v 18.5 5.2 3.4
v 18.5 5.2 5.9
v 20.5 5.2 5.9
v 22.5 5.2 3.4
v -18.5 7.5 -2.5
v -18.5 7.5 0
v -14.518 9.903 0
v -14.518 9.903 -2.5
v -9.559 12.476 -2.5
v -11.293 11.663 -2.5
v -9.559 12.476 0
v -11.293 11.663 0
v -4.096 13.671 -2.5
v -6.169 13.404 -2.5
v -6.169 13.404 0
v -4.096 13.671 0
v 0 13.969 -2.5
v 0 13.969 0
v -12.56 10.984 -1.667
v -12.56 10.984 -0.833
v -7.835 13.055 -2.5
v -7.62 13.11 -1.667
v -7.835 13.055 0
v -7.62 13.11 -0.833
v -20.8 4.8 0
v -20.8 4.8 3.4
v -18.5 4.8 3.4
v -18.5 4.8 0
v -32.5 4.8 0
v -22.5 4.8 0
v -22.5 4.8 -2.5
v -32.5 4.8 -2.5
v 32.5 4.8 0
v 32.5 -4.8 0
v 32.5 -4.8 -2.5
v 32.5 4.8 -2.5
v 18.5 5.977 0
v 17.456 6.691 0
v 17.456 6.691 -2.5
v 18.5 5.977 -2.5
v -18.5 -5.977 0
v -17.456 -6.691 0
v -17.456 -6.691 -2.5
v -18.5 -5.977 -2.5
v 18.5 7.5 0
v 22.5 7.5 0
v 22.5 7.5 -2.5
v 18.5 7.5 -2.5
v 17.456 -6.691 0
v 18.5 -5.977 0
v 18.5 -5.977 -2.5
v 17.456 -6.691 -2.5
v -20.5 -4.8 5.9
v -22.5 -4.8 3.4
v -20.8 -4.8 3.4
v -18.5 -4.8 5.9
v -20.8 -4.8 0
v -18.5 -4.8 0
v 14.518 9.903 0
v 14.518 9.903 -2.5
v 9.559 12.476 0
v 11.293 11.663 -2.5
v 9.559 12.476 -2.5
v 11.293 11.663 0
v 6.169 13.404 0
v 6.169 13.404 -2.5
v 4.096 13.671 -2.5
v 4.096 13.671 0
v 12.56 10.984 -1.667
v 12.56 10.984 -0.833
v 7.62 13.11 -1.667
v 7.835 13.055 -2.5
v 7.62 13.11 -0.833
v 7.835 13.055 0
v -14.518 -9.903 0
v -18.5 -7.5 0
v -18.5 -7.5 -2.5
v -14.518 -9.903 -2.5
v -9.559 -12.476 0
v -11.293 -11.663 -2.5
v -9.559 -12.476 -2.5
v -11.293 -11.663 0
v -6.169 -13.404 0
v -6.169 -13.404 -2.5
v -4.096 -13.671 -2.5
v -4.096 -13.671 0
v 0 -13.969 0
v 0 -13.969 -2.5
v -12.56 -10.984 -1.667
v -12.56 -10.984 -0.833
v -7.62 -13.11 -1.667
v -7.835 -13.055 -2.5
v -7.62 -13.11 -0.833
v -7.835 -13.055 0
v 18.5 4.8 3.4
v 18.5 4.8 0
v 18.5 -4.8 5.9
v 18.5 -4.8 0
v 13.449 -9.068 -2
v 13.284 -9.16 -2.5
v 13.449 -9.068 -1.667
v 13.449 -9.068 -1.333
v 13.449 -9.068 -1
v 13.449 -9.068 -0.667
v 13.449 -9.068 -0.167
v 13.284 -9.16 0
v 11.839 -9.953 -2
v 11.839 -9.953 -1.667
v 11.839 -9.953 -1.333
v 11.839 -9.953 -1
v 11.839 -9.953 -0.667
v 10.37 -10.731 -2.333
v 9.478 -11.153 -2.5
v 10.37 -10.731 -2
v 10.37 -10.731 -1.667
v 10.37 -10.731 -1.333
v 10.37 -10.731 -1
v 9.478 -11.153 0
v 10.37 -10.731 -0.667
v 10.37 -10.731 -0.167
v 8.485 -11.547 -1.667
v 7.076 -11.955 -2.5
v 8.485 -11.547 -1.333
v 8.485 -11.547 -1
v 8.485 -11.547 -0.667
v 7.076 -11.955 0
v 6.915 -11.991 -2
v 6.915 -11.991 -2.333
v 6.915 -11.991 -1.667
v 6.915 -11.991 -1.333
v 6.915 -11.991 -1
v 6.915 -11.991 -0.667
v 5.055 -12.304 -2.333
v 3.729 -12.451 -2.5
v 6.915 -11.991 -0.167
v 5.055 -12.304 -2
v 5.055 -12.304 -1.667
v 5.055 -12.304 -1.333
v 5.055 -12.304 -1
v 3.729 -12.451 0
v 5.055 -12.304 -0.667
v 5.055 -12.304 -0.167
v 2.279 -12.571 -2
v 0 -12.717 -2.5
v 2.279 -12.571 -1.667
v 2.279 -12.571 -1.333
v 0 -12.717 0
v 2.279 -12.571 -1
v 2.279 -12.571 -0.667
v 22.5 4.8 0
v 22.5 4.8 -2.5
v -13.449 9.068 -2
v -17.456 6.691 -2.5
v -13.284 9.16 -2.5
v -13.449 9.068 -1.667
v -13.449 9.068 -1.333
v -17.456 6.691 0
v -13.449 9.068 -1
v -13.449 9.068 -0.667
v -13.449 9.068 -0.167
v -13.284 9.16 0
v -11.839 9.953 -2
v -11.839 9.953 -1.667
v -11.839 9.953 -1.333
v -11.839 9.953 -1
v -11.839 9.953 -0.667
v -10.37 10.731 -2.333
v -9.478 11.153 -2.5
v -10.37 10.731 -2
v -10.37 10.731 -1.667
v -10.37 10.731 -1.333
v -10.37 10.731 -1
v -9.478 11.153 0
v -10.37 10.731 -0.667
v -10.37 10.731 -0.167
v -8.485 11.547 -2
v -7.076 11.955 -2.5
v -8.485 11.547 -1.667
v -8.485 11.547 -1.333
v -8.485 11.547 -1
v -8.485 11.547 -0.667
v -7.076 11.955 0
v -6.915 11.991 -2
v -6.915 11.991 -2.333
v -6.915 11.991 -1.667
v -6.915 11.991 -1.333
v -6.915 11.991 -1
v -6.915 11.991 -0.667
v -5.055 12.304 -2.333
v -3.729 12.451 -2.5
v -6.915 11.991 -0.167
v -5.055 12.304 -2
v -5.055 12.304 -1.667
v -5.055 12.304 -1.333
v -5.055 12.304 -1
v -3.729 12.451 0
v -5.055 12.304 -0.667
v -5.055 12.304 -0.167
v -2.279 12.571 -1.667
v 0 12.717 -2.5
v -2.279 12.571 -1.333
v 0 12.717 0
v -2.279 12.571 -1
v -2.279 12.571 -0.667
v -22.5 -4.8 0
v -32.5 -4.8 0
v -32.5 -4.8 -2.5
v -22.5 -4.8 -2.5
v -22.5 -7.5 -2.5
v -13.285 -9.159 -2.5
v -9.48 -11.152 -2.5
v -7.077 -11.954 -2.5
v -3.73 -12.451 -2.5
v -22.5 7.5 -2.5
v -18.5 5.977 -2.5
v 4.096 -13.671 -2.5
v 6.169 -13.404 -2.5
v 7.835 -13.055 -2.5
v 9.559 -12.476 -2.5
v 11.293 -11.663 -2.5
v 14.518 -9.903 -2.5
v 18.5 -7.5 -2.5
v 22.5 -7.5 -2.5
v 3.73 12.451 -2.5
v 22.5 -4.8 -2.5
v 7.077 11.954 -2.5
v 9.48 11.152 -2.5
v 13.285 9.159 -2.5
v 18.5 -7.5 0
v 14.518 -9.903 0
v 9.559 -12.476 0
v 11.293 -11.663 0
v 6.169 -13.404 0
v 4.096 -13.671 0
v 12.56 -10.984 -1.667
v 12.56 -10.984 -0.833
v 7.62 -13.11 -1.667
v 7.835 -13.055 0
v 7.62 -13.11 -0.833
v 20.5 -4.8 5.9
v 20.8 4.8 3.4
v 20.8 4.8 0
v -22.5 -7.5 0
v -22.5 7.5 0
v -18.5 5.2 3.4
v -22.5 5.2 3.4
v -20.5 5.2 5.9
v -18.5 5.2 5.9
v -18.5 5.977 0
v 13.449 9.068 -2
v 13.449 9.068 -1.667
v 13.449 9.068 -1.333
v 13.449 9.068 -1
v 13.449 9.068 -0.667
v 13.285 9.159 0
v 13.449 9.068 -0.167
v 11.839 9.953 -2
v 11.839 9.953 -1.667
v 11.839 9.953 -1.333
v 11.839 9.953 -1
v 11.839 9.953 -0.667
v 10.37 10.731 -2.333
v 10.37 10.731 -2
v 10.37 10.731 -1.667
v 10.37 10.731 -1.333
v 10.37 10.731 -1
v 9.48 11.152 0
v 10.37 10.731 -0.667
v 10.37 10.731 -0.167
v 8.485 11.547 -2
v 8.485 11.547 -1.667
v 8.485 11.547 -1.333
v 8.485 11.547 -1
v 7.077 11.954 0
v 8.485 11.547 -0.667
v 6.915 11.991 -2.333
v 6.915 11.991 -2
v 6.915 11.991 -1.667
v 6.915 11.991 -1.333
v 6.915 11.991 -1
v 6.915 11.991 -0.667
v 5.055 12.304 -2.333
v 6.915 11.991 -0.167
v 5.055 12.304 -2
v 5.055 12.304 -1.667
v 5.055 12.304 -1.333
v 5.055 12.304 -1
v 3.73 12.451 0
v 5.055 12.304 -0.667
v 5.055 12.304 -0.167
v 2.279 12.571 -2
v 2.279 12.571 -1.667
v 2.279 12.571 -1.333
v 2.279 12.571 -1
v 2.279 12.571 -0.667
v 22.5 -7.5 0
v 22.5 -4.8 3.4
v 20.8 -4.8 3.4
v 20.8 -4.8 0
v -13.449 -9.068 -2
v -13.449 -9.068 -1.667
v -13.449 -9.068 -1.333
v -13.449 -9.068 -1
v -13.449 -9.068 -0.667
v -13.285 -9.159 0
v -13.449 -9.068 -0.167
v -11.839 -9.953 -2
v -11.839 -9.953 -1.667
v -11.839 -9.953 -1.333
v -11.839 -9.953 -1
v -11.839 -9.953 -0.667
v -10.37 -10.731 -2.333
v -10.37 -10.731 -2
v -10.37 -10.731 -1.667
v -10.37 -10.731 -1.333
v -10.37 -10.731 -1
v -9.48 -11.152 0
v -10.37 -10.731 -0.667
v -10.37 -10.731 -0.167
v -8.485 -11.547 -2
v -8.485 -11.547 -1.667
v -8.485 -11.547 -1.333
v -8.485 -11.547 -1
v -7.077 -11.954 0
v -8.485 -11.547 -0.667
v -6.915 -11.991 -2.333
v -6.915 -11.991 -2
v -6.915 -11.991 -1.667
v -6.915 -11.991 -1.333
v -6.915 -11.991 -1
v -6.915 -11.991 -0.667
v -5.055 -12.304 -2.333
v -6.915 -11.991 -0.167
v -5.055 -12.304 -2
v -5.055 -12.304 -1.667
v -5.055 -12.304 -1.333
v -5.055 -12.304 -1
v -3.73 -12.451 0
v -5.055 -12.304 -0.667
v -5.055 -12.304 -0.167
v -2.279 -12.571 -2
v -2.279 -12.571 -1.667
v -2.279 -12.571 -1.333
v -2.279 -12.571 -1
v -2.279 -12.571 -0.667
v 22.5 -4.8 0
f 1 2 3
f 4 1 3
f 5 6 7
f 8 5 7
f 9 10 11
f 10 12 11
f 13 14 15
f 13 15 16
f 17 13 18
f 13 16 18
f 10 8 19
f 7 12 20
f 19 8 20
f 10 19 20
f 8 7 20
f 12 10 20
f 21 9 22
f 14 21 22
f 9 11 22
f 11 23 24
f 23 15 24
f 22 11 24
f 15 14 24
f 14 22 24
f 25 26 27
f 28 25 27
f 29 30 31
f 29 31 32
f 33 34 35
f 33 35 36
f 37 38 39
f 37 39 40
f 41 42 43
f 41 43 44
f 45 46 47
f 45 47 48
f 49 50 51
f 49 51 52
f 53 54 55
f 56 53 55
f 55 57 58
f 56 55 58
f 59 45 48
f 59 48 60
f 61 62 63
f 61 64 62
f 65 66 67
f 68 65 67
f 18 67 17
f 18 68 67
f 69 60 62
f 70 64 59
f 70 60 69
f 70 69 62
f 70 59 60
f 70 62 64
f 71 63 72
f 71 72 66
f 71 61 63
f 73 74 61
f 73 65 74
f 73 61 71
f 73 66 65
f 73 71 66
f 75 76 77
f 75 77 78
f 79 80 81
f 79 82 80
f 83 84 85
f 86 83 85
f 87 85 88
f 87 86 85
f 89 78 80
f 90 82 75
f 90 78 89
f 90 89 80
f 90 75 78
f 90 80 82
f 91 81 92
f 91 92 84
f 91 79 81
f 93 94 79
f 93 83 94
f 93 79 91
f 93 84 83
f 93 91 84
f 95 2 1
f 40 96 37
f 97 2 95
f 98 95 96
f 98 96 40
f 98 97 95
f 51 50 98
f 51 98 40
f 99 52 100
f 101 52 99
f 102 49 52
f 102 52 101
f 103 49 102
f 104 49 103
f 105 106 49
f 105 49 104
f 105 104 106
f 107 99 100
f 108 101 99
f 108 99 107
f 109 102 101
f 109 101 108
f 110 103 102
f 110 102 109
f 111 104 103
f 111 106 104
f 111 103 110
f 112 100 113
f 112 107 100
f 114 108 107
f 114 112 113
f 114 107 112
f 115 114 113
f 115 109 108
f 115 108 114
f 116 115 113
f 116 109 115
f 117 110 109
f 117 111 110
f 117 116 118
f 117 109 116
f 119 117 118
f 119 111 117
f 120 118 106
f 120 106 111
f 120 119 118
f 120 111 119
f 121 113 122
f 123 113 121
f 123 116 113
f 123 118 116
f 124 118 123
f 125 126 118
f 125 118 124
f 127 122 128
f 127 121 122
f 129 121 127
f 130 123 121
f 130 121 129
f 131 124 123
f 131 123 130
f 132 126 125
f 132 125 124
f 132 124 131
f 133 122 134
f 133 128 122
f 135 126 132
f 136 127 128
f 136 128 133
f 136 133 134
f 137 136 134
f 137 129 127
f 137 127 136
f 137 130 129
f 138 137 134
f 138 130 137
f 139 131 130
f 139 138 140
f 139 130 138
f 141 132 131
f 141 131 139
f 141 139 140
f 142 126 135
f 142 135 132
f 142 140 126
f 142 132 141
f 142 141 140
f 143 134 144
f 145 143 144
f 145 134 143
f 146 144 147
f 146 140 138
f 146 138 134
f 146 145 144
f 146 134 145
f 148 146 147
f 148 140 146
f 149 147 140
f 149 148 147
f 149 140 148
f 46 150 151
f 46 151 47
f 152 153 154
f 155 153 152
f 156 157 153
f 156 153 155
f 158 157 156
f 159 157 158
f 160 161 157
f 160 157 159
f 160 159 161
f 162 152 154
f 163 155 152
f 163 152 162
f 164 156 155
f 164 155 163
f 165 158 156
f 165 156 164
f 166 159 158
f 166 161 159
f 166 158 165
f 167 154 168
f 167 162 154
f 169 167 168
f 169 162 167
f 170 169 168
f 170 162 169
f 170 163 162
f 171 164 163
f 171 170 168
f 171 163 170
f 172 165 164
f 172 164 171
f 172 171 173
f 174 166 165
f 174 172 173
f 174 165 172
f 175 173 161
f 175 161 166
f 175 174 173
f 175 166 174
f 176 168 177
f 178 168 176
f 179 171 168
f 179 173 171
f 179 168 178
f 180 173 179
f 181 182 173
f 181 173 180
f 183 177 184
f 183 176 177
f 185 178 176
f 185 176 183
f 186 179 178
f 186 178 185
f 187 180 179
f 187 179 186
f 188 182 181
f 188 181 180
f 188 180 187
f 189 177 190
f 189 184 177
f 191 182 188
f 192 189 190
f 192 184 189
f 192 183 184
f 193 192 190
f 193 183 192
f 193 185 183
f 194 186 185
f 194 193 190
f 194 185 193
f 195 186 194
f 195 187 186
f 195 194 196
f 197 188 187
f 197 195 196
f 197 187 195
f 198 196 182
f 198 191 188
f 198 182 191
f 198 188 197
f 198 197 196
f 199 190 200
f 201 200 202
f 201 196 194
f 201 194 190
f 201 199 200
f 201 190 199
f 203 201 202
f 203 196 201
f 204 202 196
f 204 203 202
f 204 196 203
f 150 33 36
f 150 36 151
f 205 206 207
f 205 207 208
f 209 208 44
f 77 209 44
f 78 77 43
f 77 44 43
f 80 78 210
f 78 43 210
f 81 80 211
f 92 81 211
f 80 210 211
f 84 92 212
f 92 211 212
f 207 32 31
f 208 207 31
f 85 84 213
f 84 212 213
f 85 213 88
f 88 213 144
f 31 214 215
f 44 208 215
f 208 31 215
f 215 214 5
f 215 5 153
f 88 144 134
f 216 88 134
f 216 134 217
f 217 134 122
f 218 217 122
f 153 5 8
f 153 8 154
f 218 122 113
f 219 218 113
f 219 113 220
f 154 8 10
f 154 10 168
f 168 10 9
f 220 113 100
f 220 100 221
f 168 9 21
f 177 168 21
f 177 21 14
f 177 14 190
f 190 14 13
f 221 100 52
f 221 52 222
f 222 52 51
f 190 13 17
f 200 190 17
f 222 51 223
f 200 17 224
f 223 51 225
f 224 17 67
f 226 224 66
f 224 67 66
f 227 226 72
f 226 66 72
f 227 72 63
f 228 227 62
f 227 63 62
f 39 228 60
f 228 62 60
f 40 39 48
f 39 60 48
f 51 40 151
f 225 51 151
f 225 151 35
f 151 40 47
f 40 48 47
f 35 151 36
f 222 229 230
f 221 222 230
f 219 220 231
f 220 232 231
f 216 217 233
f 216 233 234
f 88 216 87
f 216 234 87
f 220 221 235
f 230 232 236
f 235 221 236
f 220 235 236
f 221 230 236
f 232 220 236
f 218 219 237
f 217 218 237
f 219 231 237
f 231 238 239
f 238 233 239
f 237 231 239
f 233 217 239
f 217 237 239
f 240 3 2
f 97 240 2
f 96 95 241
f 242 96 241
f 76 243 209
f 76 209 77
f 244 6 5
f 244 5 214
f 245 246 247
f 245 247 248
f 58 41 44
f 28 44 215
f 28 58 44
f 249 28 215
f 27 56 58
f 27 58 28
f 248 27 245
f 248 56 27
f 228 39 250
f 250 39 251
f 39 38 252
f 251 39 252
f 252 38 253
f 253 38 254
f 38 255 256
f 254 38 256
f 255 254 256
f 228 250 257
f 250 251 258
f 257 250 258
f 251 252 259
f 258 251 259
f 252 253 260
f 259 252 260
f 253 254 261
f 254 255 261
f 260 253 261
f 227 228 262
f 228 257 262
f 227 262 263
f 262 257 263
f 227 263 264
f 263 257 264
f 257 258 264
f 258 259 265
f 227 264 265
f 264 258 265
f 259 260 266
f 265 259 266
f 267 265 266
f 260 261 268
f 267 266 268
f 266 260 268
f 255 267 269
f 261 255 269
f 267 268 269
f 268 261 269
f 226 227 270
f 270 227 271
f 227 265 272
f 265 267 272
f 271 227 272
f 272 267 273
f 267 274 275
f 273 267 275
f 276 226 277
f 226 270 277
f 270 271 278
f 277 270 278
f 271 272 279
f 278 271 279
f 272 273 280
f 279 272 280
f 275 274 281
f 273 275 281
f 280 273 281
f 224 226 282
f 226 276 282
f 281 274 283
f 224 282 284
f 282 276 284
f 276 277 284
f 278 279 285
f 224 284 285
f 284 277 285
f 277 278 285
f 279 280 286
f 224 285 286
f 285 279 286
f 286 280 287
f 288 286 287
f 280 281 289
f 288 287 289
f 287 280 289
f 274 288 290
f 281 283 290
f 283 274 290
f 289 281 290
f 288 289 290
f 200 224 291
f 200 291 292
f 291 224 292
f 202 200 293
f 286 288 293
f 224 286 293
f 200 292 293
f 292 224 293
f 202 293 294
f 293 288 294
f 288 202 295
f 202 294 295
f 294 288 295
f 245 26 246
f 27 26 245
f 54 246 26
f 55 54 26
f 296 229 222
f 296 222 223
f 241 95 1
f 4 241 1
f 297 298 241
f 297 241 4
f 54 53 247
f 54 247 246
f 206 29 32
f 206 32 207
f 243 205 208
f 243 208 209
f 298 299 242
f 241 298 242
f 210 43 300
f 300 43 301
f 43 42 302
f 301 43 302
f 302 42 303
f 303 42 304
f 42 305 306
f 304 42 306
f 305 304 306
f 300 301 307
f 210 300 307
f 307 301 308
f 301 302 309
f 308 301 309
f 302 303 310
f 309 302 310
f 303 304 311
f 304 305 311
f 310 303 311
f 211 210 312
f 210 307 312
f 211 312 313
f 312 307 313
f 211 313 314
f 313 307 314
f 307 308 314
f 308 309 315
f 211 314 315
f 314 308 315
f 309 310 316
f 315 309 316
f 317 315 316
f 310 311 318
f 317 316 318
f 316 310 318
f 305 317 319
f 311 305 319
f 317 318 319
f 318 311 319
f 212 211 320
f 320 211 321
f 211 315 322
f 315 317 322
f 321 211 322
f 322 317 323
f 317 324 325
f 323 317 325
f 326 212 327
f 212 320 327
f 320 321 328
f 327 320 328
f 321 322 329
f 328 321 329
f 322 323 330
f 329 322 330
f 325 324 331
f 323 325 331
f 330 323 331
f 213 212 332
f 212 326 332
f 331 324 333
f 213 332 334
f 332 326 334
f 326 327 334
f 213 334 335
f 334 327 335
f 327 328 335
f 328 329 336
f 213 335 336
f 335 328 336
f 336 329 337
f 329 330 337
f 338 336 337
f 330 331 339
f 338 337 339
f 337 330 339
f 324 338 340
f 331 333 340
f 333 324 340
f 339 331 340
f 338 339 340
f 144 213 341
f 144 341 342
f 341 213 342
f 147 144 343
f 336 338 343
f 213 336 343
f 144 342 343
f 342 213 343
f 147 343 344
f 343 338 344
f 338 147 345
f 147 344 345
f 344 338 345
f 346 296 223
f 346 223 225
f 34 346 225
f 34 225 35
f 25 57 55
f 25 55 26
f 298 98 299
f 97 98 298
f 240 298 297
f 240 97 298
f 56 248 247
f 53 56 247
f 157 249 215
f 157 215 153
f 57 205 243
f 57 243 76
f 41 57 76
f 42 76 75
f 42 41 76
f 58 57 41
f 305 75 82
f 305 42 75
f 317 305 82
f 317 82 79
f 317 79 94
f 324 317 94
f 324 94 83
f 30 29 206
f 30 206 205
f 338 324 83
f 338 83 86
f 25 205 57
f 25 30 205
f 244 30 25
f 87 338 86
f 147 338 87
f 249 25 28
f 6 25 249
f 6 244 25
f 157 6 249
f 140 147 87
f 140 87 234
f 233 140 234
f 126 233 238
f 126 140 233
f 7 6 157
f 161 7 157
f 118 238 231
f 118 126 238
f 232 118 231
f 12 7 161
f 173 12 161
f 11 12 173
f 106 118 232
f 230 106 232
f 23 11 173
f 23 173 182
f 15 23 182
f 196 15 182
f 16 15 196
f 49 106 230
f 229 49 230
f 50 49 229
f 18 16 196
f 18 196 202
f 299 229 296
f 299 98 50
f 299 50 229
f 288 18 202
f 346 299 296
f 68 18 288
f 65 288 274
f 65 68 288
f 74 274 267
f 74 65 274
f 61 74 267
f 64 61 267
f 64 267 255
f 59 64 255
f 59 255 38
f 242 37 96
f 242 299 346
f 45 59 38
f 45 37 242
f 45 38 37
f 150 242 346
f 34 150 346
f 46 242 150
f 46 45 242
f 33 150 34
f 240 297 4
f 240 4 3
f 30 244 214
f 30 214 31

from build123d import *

# Parameters (mm, degrees)
F1_DEPTH = 2.5
F2_W     = 2.3
F2_H     = 9.6
F3_DEPTH = 3.4
F5_DEPTH = 10


# Not quite as in the source:
# - ends of sketch curves that miss each other by under 0.0002 mm in the source are joined
# - the dataset's text gives a spline's control points without its knots; the knots are read off the source's solid


with BuildPart() as f1:
    # F0 (on Top) → F1 (new body)
    with BuildSketch(Plane.XY):
        with BuildLine():
            Line((32.5, -4.8), (32.5, 0))
            Line((32.5, 0), (32.5, 4.8))
            Line((32.5, 4.8), (22.5, 4.8))
            Line((22.5, 4.8), (22.5, 7.5))
            Line((22.5, 7.5), (18.5, 7.5))
            add(Edge.make_bspline(
                [(18.5, 7.5), (16.6328875571, 8.7478424674), (12.4879926615, 11.0335251601), (7.8863773573, 13.5145464122), (2.5994103613, 13.8122400643), (0, 13.9694881193)],
                knots=[0, 0, 0, 0, 0.3363717727, 0.6336483956, 0.9777931055, 0.9777931055, 0.9777931055, 0.9777931055], degree=3))
            add(Edge.make_bspline(
                [(-18.5, 7.5), (-16.6328875571, 8.7478424674), (-12.4879926615, 11.0335251601), (-7.8863773573, 13.5145464122), (-2.5994103613, 13.8122400643), (0, 13.9694881193)],
                knots=[0, 0, 0, 0, 0.3363717727, 0.6336483956, 0.9777931055, 0.9777931055, 0.9777931055, 0.9777931055], degree=3))
            Line((-18.5, 7.5), (-22.5, 7.5))
            Line((-22.5, 7.5), (-22.5, 4.8))
            Line((-22.5, 4.8), (-32.5, 4.8))
            Line((-32.5, 4.8), (-32.5, 0))
            Line((-32.5, 0), (-32.5, -4.8))
            Line((-32.5, -4.8), (-22.5, -4.8))
            Line((-22.5, -4.8), (-22.5, -7.5))
            Line((-22.5, -7.5), (-18.5, -7.5))
            add(Edge.make_bspline(
                [(-18.5, -7.5), (-16.6328875571, -8.7478424674), (-12.4879926615, -11.0335251601), (-7.8863773573, -13.5145464122), (-2.5994103613, -13.8122400643), (0, -13.9694881193)],
                knots=[0, 0, 0, 0, 0.3363717727, 0.6336483956, 0.9777931055, 0.9777931055, 0.9777931055, 0.9777931055], degree=3))
            add(Edge.make_bspline(
                [(18.5, -7.5), (16.6328875571, -8.7478424674), (12.4879926615, -11.0335251601), (7.8863773573, -13.5145464122), (2.5994103613, -13.8122400643), (0, -13.9694881193)],
                knots=[0, 0, 0, 0, 0.3363717727, 0.6336483956, 0.9777931055, 0.9777931055, 0.9777931055, 0.9777931055], degree=3))
            Line((18.5, -7.5), (22.5, -7.5))
            Line((22.5, -7.5), (22.5, -4.8))
            Line((22.5, -4.8), (32.5, -4.8))
        make_face()
        with BuildLine():
            Line((-18.5, 0), (-18.5, 5.9768469073))
            Line((-18.5, 5.9768469073), (-17.4557828979, 6.6914400202))
            add(Edge.make_bspline(
                [(-17.4557828979, 6.6914400202), (-16.8874977541, 7.0617589277), (-15.5631242254, 7.8773690533), (-13.8072733089, 8.8734333253), (-12.5364597536, 9.5720832259), (-11.8350717008, 9.9552778211), (-11.1621909622, 10.3213808687), (-10.364996594, 10.7418634519), (-9.4382542316, 11.1823324733), (-8.4958782817, 11.5579825068), (-7.6562822144, 11.8178001131), (-6.921672188, 11.9930107338), (-6.1338774618, 12.1498095188), (-5.0696801932, 12.3116557143), (-3.7025355233, 12.4602871457), (-2.0018671704, 12.5972327818), (-0.7534045854, 12.6716577772), (5.394e-07, 12.717197038)],
                knots=[0.0214889286, 0.0214889286, 0.0214889286, 0.0214889286, 0.125, 0.25, 0.3125, 0.34375, 0.375, 0.4375, 0.5, 0.5625, 0.625, 0.65625, 0.6875, 0.75, 0.8125, 0.875, 0.9744706617, 0.9744706617, 0.9744706617, 0.9744706617], degree=3))
            add(Edge.make_bspline(
                [(17.4557781808, 6.6914327816), (16.8874977541, 7.0617589277), (15.5631242254, 7.8773690533), (13.8072733089, 8.8734333253), (12.5364597536, 9.5720832259), (11.8350717008, 9.9552778211), (11.1621909622, 10.3213808687), (10.364996594, 10.7418634519), (9.4382542316, 11.1823324733), (8.4958782817, 11.5579825068), (7.6562822144, 11.8178001131), (6.921672188, 11.9930107338), (6.1338774618, 12.1498095188), (5.0696801932, 12.3116557143), (3.7025355233, 12.4602871457), (2.0018675288, 12.597232753), (0.7534053146, 12.6716577338), (5.394e-07, 12.717197038)],
                knots=[0.0214889286, 0.0214889286, 0.0214889286, 0.0214889286, 0.125, 0.25, 0.3125, 0.34375, 0.375, 0.4375, 0.5, 0.5625, 0.625, 0.65625, 0.6875, 0.75, 0.8125, 0.875, 0.9744706144, 0.9744706144, 0.9744706144, 0.9744706144], degree=3))
            Line((17.4557781808, 6.6914327816), (18.5, 5.9768469073))
            Line((18.5, 5.9768469073), (18.5, 5))
            Line((18.5, 5), (18.5, 0))
            Line((18.5, 0), (18.5, -5.9768469073))
            Line((18.5, -5.9768469073), (17.4557828979, -6.6914400202))
            add(Edge.make_bspline(
                [(17.4557828979, -6.6914400202), (16.8874977541, -7.0617589277), (15.5631242254, -7.8773690533), (13.8072733089, -8.8734333253), (12.5364597536, -9.5720832259), (11.8350717008, -9.9552778211), (11.1621909622, -10.3213808687), (10.364996594, -10.7418634519), (9.4382542316, -11.1823324733), (8.4958782817, -11.5579825068), (7.6562822144, -11.8178001131), (6.921672188, -11.9930107338), (6.1338774618, -12.1498095188), (5.0696801932, -12.3116557143), (3.7025355233, -12.4602871457), (2.0018673502, -12.5972327673), (0.7534049513, -12.6716577554), (0, -12.7171970054)],
                knots=[0.0214889286, 0.0214889286, 0.0214889286, 0.0214889286, 0.125, 0.25, 0.3125, 0.34375, 0.375, 0.4375, 0.5, 0.5625, 0.625, 0.65625, 0.6875, 0.75, 0.8125, 0.875, 0.974470638, 0.974470638, 0.974470638, 0.974470638], degree=3))
            add(Edge.make_bspline(
                [(-17.4557781808, -6.6914327816), (-16.8874977541, -7.0617589277), (-15.5631242254, -7.8773690533), (-13.8072733089, -8.8734333253), (-12.5364597536, -9.5720832259), (-11.8350717008, -9.9552778211), (-11.1621909622, -10.3213808687), (-10.364996594, -10.7418634519), (-9.4382542316, -11.1823324733), (-8.4958782817, -11.5579825068), (-7.6562822144, -11.8178001131), (-6.921672188, -11.9930107338), (-6.1338774618, -12.1498095188), (-5.0696801932, -12.3116557143), (-3.7025355233, -12.4602871457), (-2.0018673502, -12.5972327673), (-0.7534049513, -12.6716577554), (0, -12.7171970054)],
                knots=[0.0214889286, 0.0214889286, 0.0214889286, 0.0214889286, 0.125, 0.25, 0.3125, 0.34375, 0.375, 0.4375, 0.5, 0.5625, 0.625, 0.65625, 0.6875, 0.75, 0.8125, 0.875, 0.974470638, 0.974470638, 0.974470638, 0.974470638], degree=3))
            Line((-17.4557781808, -6.6914327816), (-18.5, -5.9768469073))
            Line((-18.5, -5.9768469073), (-18.5, 0))
        make_face(mode=Mode.SUBTRACT)
    extrude(amount=-F1_DEPTH)

    # F2 (on face) → F3 (join)
    with BuildSketch(Plane.XY):
        with Locations((19.65, 0)):
            Rectangle(F2_W, F2_H)
        with Locations((-19.65, 0)):
            Rectangle(F2_W, F2_H)
    extrude(amount=F3_DEPTH)

    # F4 (on face) → F5 (join)
    with BuildSketch(Plane.XZ.offset(4.8)):
        Polygon((18.5, 5.9), (18.5, 3.4), (22.5, 3.4), (20.5, 5.9), align=None)
        Polygon((-20.5, 5.9), (-22.5, 3.4), (-18.5, 3.4), (-18.5, 5.9), align=None)
    extrude(amount=-F5_DEPTH)


solid = f1.part
